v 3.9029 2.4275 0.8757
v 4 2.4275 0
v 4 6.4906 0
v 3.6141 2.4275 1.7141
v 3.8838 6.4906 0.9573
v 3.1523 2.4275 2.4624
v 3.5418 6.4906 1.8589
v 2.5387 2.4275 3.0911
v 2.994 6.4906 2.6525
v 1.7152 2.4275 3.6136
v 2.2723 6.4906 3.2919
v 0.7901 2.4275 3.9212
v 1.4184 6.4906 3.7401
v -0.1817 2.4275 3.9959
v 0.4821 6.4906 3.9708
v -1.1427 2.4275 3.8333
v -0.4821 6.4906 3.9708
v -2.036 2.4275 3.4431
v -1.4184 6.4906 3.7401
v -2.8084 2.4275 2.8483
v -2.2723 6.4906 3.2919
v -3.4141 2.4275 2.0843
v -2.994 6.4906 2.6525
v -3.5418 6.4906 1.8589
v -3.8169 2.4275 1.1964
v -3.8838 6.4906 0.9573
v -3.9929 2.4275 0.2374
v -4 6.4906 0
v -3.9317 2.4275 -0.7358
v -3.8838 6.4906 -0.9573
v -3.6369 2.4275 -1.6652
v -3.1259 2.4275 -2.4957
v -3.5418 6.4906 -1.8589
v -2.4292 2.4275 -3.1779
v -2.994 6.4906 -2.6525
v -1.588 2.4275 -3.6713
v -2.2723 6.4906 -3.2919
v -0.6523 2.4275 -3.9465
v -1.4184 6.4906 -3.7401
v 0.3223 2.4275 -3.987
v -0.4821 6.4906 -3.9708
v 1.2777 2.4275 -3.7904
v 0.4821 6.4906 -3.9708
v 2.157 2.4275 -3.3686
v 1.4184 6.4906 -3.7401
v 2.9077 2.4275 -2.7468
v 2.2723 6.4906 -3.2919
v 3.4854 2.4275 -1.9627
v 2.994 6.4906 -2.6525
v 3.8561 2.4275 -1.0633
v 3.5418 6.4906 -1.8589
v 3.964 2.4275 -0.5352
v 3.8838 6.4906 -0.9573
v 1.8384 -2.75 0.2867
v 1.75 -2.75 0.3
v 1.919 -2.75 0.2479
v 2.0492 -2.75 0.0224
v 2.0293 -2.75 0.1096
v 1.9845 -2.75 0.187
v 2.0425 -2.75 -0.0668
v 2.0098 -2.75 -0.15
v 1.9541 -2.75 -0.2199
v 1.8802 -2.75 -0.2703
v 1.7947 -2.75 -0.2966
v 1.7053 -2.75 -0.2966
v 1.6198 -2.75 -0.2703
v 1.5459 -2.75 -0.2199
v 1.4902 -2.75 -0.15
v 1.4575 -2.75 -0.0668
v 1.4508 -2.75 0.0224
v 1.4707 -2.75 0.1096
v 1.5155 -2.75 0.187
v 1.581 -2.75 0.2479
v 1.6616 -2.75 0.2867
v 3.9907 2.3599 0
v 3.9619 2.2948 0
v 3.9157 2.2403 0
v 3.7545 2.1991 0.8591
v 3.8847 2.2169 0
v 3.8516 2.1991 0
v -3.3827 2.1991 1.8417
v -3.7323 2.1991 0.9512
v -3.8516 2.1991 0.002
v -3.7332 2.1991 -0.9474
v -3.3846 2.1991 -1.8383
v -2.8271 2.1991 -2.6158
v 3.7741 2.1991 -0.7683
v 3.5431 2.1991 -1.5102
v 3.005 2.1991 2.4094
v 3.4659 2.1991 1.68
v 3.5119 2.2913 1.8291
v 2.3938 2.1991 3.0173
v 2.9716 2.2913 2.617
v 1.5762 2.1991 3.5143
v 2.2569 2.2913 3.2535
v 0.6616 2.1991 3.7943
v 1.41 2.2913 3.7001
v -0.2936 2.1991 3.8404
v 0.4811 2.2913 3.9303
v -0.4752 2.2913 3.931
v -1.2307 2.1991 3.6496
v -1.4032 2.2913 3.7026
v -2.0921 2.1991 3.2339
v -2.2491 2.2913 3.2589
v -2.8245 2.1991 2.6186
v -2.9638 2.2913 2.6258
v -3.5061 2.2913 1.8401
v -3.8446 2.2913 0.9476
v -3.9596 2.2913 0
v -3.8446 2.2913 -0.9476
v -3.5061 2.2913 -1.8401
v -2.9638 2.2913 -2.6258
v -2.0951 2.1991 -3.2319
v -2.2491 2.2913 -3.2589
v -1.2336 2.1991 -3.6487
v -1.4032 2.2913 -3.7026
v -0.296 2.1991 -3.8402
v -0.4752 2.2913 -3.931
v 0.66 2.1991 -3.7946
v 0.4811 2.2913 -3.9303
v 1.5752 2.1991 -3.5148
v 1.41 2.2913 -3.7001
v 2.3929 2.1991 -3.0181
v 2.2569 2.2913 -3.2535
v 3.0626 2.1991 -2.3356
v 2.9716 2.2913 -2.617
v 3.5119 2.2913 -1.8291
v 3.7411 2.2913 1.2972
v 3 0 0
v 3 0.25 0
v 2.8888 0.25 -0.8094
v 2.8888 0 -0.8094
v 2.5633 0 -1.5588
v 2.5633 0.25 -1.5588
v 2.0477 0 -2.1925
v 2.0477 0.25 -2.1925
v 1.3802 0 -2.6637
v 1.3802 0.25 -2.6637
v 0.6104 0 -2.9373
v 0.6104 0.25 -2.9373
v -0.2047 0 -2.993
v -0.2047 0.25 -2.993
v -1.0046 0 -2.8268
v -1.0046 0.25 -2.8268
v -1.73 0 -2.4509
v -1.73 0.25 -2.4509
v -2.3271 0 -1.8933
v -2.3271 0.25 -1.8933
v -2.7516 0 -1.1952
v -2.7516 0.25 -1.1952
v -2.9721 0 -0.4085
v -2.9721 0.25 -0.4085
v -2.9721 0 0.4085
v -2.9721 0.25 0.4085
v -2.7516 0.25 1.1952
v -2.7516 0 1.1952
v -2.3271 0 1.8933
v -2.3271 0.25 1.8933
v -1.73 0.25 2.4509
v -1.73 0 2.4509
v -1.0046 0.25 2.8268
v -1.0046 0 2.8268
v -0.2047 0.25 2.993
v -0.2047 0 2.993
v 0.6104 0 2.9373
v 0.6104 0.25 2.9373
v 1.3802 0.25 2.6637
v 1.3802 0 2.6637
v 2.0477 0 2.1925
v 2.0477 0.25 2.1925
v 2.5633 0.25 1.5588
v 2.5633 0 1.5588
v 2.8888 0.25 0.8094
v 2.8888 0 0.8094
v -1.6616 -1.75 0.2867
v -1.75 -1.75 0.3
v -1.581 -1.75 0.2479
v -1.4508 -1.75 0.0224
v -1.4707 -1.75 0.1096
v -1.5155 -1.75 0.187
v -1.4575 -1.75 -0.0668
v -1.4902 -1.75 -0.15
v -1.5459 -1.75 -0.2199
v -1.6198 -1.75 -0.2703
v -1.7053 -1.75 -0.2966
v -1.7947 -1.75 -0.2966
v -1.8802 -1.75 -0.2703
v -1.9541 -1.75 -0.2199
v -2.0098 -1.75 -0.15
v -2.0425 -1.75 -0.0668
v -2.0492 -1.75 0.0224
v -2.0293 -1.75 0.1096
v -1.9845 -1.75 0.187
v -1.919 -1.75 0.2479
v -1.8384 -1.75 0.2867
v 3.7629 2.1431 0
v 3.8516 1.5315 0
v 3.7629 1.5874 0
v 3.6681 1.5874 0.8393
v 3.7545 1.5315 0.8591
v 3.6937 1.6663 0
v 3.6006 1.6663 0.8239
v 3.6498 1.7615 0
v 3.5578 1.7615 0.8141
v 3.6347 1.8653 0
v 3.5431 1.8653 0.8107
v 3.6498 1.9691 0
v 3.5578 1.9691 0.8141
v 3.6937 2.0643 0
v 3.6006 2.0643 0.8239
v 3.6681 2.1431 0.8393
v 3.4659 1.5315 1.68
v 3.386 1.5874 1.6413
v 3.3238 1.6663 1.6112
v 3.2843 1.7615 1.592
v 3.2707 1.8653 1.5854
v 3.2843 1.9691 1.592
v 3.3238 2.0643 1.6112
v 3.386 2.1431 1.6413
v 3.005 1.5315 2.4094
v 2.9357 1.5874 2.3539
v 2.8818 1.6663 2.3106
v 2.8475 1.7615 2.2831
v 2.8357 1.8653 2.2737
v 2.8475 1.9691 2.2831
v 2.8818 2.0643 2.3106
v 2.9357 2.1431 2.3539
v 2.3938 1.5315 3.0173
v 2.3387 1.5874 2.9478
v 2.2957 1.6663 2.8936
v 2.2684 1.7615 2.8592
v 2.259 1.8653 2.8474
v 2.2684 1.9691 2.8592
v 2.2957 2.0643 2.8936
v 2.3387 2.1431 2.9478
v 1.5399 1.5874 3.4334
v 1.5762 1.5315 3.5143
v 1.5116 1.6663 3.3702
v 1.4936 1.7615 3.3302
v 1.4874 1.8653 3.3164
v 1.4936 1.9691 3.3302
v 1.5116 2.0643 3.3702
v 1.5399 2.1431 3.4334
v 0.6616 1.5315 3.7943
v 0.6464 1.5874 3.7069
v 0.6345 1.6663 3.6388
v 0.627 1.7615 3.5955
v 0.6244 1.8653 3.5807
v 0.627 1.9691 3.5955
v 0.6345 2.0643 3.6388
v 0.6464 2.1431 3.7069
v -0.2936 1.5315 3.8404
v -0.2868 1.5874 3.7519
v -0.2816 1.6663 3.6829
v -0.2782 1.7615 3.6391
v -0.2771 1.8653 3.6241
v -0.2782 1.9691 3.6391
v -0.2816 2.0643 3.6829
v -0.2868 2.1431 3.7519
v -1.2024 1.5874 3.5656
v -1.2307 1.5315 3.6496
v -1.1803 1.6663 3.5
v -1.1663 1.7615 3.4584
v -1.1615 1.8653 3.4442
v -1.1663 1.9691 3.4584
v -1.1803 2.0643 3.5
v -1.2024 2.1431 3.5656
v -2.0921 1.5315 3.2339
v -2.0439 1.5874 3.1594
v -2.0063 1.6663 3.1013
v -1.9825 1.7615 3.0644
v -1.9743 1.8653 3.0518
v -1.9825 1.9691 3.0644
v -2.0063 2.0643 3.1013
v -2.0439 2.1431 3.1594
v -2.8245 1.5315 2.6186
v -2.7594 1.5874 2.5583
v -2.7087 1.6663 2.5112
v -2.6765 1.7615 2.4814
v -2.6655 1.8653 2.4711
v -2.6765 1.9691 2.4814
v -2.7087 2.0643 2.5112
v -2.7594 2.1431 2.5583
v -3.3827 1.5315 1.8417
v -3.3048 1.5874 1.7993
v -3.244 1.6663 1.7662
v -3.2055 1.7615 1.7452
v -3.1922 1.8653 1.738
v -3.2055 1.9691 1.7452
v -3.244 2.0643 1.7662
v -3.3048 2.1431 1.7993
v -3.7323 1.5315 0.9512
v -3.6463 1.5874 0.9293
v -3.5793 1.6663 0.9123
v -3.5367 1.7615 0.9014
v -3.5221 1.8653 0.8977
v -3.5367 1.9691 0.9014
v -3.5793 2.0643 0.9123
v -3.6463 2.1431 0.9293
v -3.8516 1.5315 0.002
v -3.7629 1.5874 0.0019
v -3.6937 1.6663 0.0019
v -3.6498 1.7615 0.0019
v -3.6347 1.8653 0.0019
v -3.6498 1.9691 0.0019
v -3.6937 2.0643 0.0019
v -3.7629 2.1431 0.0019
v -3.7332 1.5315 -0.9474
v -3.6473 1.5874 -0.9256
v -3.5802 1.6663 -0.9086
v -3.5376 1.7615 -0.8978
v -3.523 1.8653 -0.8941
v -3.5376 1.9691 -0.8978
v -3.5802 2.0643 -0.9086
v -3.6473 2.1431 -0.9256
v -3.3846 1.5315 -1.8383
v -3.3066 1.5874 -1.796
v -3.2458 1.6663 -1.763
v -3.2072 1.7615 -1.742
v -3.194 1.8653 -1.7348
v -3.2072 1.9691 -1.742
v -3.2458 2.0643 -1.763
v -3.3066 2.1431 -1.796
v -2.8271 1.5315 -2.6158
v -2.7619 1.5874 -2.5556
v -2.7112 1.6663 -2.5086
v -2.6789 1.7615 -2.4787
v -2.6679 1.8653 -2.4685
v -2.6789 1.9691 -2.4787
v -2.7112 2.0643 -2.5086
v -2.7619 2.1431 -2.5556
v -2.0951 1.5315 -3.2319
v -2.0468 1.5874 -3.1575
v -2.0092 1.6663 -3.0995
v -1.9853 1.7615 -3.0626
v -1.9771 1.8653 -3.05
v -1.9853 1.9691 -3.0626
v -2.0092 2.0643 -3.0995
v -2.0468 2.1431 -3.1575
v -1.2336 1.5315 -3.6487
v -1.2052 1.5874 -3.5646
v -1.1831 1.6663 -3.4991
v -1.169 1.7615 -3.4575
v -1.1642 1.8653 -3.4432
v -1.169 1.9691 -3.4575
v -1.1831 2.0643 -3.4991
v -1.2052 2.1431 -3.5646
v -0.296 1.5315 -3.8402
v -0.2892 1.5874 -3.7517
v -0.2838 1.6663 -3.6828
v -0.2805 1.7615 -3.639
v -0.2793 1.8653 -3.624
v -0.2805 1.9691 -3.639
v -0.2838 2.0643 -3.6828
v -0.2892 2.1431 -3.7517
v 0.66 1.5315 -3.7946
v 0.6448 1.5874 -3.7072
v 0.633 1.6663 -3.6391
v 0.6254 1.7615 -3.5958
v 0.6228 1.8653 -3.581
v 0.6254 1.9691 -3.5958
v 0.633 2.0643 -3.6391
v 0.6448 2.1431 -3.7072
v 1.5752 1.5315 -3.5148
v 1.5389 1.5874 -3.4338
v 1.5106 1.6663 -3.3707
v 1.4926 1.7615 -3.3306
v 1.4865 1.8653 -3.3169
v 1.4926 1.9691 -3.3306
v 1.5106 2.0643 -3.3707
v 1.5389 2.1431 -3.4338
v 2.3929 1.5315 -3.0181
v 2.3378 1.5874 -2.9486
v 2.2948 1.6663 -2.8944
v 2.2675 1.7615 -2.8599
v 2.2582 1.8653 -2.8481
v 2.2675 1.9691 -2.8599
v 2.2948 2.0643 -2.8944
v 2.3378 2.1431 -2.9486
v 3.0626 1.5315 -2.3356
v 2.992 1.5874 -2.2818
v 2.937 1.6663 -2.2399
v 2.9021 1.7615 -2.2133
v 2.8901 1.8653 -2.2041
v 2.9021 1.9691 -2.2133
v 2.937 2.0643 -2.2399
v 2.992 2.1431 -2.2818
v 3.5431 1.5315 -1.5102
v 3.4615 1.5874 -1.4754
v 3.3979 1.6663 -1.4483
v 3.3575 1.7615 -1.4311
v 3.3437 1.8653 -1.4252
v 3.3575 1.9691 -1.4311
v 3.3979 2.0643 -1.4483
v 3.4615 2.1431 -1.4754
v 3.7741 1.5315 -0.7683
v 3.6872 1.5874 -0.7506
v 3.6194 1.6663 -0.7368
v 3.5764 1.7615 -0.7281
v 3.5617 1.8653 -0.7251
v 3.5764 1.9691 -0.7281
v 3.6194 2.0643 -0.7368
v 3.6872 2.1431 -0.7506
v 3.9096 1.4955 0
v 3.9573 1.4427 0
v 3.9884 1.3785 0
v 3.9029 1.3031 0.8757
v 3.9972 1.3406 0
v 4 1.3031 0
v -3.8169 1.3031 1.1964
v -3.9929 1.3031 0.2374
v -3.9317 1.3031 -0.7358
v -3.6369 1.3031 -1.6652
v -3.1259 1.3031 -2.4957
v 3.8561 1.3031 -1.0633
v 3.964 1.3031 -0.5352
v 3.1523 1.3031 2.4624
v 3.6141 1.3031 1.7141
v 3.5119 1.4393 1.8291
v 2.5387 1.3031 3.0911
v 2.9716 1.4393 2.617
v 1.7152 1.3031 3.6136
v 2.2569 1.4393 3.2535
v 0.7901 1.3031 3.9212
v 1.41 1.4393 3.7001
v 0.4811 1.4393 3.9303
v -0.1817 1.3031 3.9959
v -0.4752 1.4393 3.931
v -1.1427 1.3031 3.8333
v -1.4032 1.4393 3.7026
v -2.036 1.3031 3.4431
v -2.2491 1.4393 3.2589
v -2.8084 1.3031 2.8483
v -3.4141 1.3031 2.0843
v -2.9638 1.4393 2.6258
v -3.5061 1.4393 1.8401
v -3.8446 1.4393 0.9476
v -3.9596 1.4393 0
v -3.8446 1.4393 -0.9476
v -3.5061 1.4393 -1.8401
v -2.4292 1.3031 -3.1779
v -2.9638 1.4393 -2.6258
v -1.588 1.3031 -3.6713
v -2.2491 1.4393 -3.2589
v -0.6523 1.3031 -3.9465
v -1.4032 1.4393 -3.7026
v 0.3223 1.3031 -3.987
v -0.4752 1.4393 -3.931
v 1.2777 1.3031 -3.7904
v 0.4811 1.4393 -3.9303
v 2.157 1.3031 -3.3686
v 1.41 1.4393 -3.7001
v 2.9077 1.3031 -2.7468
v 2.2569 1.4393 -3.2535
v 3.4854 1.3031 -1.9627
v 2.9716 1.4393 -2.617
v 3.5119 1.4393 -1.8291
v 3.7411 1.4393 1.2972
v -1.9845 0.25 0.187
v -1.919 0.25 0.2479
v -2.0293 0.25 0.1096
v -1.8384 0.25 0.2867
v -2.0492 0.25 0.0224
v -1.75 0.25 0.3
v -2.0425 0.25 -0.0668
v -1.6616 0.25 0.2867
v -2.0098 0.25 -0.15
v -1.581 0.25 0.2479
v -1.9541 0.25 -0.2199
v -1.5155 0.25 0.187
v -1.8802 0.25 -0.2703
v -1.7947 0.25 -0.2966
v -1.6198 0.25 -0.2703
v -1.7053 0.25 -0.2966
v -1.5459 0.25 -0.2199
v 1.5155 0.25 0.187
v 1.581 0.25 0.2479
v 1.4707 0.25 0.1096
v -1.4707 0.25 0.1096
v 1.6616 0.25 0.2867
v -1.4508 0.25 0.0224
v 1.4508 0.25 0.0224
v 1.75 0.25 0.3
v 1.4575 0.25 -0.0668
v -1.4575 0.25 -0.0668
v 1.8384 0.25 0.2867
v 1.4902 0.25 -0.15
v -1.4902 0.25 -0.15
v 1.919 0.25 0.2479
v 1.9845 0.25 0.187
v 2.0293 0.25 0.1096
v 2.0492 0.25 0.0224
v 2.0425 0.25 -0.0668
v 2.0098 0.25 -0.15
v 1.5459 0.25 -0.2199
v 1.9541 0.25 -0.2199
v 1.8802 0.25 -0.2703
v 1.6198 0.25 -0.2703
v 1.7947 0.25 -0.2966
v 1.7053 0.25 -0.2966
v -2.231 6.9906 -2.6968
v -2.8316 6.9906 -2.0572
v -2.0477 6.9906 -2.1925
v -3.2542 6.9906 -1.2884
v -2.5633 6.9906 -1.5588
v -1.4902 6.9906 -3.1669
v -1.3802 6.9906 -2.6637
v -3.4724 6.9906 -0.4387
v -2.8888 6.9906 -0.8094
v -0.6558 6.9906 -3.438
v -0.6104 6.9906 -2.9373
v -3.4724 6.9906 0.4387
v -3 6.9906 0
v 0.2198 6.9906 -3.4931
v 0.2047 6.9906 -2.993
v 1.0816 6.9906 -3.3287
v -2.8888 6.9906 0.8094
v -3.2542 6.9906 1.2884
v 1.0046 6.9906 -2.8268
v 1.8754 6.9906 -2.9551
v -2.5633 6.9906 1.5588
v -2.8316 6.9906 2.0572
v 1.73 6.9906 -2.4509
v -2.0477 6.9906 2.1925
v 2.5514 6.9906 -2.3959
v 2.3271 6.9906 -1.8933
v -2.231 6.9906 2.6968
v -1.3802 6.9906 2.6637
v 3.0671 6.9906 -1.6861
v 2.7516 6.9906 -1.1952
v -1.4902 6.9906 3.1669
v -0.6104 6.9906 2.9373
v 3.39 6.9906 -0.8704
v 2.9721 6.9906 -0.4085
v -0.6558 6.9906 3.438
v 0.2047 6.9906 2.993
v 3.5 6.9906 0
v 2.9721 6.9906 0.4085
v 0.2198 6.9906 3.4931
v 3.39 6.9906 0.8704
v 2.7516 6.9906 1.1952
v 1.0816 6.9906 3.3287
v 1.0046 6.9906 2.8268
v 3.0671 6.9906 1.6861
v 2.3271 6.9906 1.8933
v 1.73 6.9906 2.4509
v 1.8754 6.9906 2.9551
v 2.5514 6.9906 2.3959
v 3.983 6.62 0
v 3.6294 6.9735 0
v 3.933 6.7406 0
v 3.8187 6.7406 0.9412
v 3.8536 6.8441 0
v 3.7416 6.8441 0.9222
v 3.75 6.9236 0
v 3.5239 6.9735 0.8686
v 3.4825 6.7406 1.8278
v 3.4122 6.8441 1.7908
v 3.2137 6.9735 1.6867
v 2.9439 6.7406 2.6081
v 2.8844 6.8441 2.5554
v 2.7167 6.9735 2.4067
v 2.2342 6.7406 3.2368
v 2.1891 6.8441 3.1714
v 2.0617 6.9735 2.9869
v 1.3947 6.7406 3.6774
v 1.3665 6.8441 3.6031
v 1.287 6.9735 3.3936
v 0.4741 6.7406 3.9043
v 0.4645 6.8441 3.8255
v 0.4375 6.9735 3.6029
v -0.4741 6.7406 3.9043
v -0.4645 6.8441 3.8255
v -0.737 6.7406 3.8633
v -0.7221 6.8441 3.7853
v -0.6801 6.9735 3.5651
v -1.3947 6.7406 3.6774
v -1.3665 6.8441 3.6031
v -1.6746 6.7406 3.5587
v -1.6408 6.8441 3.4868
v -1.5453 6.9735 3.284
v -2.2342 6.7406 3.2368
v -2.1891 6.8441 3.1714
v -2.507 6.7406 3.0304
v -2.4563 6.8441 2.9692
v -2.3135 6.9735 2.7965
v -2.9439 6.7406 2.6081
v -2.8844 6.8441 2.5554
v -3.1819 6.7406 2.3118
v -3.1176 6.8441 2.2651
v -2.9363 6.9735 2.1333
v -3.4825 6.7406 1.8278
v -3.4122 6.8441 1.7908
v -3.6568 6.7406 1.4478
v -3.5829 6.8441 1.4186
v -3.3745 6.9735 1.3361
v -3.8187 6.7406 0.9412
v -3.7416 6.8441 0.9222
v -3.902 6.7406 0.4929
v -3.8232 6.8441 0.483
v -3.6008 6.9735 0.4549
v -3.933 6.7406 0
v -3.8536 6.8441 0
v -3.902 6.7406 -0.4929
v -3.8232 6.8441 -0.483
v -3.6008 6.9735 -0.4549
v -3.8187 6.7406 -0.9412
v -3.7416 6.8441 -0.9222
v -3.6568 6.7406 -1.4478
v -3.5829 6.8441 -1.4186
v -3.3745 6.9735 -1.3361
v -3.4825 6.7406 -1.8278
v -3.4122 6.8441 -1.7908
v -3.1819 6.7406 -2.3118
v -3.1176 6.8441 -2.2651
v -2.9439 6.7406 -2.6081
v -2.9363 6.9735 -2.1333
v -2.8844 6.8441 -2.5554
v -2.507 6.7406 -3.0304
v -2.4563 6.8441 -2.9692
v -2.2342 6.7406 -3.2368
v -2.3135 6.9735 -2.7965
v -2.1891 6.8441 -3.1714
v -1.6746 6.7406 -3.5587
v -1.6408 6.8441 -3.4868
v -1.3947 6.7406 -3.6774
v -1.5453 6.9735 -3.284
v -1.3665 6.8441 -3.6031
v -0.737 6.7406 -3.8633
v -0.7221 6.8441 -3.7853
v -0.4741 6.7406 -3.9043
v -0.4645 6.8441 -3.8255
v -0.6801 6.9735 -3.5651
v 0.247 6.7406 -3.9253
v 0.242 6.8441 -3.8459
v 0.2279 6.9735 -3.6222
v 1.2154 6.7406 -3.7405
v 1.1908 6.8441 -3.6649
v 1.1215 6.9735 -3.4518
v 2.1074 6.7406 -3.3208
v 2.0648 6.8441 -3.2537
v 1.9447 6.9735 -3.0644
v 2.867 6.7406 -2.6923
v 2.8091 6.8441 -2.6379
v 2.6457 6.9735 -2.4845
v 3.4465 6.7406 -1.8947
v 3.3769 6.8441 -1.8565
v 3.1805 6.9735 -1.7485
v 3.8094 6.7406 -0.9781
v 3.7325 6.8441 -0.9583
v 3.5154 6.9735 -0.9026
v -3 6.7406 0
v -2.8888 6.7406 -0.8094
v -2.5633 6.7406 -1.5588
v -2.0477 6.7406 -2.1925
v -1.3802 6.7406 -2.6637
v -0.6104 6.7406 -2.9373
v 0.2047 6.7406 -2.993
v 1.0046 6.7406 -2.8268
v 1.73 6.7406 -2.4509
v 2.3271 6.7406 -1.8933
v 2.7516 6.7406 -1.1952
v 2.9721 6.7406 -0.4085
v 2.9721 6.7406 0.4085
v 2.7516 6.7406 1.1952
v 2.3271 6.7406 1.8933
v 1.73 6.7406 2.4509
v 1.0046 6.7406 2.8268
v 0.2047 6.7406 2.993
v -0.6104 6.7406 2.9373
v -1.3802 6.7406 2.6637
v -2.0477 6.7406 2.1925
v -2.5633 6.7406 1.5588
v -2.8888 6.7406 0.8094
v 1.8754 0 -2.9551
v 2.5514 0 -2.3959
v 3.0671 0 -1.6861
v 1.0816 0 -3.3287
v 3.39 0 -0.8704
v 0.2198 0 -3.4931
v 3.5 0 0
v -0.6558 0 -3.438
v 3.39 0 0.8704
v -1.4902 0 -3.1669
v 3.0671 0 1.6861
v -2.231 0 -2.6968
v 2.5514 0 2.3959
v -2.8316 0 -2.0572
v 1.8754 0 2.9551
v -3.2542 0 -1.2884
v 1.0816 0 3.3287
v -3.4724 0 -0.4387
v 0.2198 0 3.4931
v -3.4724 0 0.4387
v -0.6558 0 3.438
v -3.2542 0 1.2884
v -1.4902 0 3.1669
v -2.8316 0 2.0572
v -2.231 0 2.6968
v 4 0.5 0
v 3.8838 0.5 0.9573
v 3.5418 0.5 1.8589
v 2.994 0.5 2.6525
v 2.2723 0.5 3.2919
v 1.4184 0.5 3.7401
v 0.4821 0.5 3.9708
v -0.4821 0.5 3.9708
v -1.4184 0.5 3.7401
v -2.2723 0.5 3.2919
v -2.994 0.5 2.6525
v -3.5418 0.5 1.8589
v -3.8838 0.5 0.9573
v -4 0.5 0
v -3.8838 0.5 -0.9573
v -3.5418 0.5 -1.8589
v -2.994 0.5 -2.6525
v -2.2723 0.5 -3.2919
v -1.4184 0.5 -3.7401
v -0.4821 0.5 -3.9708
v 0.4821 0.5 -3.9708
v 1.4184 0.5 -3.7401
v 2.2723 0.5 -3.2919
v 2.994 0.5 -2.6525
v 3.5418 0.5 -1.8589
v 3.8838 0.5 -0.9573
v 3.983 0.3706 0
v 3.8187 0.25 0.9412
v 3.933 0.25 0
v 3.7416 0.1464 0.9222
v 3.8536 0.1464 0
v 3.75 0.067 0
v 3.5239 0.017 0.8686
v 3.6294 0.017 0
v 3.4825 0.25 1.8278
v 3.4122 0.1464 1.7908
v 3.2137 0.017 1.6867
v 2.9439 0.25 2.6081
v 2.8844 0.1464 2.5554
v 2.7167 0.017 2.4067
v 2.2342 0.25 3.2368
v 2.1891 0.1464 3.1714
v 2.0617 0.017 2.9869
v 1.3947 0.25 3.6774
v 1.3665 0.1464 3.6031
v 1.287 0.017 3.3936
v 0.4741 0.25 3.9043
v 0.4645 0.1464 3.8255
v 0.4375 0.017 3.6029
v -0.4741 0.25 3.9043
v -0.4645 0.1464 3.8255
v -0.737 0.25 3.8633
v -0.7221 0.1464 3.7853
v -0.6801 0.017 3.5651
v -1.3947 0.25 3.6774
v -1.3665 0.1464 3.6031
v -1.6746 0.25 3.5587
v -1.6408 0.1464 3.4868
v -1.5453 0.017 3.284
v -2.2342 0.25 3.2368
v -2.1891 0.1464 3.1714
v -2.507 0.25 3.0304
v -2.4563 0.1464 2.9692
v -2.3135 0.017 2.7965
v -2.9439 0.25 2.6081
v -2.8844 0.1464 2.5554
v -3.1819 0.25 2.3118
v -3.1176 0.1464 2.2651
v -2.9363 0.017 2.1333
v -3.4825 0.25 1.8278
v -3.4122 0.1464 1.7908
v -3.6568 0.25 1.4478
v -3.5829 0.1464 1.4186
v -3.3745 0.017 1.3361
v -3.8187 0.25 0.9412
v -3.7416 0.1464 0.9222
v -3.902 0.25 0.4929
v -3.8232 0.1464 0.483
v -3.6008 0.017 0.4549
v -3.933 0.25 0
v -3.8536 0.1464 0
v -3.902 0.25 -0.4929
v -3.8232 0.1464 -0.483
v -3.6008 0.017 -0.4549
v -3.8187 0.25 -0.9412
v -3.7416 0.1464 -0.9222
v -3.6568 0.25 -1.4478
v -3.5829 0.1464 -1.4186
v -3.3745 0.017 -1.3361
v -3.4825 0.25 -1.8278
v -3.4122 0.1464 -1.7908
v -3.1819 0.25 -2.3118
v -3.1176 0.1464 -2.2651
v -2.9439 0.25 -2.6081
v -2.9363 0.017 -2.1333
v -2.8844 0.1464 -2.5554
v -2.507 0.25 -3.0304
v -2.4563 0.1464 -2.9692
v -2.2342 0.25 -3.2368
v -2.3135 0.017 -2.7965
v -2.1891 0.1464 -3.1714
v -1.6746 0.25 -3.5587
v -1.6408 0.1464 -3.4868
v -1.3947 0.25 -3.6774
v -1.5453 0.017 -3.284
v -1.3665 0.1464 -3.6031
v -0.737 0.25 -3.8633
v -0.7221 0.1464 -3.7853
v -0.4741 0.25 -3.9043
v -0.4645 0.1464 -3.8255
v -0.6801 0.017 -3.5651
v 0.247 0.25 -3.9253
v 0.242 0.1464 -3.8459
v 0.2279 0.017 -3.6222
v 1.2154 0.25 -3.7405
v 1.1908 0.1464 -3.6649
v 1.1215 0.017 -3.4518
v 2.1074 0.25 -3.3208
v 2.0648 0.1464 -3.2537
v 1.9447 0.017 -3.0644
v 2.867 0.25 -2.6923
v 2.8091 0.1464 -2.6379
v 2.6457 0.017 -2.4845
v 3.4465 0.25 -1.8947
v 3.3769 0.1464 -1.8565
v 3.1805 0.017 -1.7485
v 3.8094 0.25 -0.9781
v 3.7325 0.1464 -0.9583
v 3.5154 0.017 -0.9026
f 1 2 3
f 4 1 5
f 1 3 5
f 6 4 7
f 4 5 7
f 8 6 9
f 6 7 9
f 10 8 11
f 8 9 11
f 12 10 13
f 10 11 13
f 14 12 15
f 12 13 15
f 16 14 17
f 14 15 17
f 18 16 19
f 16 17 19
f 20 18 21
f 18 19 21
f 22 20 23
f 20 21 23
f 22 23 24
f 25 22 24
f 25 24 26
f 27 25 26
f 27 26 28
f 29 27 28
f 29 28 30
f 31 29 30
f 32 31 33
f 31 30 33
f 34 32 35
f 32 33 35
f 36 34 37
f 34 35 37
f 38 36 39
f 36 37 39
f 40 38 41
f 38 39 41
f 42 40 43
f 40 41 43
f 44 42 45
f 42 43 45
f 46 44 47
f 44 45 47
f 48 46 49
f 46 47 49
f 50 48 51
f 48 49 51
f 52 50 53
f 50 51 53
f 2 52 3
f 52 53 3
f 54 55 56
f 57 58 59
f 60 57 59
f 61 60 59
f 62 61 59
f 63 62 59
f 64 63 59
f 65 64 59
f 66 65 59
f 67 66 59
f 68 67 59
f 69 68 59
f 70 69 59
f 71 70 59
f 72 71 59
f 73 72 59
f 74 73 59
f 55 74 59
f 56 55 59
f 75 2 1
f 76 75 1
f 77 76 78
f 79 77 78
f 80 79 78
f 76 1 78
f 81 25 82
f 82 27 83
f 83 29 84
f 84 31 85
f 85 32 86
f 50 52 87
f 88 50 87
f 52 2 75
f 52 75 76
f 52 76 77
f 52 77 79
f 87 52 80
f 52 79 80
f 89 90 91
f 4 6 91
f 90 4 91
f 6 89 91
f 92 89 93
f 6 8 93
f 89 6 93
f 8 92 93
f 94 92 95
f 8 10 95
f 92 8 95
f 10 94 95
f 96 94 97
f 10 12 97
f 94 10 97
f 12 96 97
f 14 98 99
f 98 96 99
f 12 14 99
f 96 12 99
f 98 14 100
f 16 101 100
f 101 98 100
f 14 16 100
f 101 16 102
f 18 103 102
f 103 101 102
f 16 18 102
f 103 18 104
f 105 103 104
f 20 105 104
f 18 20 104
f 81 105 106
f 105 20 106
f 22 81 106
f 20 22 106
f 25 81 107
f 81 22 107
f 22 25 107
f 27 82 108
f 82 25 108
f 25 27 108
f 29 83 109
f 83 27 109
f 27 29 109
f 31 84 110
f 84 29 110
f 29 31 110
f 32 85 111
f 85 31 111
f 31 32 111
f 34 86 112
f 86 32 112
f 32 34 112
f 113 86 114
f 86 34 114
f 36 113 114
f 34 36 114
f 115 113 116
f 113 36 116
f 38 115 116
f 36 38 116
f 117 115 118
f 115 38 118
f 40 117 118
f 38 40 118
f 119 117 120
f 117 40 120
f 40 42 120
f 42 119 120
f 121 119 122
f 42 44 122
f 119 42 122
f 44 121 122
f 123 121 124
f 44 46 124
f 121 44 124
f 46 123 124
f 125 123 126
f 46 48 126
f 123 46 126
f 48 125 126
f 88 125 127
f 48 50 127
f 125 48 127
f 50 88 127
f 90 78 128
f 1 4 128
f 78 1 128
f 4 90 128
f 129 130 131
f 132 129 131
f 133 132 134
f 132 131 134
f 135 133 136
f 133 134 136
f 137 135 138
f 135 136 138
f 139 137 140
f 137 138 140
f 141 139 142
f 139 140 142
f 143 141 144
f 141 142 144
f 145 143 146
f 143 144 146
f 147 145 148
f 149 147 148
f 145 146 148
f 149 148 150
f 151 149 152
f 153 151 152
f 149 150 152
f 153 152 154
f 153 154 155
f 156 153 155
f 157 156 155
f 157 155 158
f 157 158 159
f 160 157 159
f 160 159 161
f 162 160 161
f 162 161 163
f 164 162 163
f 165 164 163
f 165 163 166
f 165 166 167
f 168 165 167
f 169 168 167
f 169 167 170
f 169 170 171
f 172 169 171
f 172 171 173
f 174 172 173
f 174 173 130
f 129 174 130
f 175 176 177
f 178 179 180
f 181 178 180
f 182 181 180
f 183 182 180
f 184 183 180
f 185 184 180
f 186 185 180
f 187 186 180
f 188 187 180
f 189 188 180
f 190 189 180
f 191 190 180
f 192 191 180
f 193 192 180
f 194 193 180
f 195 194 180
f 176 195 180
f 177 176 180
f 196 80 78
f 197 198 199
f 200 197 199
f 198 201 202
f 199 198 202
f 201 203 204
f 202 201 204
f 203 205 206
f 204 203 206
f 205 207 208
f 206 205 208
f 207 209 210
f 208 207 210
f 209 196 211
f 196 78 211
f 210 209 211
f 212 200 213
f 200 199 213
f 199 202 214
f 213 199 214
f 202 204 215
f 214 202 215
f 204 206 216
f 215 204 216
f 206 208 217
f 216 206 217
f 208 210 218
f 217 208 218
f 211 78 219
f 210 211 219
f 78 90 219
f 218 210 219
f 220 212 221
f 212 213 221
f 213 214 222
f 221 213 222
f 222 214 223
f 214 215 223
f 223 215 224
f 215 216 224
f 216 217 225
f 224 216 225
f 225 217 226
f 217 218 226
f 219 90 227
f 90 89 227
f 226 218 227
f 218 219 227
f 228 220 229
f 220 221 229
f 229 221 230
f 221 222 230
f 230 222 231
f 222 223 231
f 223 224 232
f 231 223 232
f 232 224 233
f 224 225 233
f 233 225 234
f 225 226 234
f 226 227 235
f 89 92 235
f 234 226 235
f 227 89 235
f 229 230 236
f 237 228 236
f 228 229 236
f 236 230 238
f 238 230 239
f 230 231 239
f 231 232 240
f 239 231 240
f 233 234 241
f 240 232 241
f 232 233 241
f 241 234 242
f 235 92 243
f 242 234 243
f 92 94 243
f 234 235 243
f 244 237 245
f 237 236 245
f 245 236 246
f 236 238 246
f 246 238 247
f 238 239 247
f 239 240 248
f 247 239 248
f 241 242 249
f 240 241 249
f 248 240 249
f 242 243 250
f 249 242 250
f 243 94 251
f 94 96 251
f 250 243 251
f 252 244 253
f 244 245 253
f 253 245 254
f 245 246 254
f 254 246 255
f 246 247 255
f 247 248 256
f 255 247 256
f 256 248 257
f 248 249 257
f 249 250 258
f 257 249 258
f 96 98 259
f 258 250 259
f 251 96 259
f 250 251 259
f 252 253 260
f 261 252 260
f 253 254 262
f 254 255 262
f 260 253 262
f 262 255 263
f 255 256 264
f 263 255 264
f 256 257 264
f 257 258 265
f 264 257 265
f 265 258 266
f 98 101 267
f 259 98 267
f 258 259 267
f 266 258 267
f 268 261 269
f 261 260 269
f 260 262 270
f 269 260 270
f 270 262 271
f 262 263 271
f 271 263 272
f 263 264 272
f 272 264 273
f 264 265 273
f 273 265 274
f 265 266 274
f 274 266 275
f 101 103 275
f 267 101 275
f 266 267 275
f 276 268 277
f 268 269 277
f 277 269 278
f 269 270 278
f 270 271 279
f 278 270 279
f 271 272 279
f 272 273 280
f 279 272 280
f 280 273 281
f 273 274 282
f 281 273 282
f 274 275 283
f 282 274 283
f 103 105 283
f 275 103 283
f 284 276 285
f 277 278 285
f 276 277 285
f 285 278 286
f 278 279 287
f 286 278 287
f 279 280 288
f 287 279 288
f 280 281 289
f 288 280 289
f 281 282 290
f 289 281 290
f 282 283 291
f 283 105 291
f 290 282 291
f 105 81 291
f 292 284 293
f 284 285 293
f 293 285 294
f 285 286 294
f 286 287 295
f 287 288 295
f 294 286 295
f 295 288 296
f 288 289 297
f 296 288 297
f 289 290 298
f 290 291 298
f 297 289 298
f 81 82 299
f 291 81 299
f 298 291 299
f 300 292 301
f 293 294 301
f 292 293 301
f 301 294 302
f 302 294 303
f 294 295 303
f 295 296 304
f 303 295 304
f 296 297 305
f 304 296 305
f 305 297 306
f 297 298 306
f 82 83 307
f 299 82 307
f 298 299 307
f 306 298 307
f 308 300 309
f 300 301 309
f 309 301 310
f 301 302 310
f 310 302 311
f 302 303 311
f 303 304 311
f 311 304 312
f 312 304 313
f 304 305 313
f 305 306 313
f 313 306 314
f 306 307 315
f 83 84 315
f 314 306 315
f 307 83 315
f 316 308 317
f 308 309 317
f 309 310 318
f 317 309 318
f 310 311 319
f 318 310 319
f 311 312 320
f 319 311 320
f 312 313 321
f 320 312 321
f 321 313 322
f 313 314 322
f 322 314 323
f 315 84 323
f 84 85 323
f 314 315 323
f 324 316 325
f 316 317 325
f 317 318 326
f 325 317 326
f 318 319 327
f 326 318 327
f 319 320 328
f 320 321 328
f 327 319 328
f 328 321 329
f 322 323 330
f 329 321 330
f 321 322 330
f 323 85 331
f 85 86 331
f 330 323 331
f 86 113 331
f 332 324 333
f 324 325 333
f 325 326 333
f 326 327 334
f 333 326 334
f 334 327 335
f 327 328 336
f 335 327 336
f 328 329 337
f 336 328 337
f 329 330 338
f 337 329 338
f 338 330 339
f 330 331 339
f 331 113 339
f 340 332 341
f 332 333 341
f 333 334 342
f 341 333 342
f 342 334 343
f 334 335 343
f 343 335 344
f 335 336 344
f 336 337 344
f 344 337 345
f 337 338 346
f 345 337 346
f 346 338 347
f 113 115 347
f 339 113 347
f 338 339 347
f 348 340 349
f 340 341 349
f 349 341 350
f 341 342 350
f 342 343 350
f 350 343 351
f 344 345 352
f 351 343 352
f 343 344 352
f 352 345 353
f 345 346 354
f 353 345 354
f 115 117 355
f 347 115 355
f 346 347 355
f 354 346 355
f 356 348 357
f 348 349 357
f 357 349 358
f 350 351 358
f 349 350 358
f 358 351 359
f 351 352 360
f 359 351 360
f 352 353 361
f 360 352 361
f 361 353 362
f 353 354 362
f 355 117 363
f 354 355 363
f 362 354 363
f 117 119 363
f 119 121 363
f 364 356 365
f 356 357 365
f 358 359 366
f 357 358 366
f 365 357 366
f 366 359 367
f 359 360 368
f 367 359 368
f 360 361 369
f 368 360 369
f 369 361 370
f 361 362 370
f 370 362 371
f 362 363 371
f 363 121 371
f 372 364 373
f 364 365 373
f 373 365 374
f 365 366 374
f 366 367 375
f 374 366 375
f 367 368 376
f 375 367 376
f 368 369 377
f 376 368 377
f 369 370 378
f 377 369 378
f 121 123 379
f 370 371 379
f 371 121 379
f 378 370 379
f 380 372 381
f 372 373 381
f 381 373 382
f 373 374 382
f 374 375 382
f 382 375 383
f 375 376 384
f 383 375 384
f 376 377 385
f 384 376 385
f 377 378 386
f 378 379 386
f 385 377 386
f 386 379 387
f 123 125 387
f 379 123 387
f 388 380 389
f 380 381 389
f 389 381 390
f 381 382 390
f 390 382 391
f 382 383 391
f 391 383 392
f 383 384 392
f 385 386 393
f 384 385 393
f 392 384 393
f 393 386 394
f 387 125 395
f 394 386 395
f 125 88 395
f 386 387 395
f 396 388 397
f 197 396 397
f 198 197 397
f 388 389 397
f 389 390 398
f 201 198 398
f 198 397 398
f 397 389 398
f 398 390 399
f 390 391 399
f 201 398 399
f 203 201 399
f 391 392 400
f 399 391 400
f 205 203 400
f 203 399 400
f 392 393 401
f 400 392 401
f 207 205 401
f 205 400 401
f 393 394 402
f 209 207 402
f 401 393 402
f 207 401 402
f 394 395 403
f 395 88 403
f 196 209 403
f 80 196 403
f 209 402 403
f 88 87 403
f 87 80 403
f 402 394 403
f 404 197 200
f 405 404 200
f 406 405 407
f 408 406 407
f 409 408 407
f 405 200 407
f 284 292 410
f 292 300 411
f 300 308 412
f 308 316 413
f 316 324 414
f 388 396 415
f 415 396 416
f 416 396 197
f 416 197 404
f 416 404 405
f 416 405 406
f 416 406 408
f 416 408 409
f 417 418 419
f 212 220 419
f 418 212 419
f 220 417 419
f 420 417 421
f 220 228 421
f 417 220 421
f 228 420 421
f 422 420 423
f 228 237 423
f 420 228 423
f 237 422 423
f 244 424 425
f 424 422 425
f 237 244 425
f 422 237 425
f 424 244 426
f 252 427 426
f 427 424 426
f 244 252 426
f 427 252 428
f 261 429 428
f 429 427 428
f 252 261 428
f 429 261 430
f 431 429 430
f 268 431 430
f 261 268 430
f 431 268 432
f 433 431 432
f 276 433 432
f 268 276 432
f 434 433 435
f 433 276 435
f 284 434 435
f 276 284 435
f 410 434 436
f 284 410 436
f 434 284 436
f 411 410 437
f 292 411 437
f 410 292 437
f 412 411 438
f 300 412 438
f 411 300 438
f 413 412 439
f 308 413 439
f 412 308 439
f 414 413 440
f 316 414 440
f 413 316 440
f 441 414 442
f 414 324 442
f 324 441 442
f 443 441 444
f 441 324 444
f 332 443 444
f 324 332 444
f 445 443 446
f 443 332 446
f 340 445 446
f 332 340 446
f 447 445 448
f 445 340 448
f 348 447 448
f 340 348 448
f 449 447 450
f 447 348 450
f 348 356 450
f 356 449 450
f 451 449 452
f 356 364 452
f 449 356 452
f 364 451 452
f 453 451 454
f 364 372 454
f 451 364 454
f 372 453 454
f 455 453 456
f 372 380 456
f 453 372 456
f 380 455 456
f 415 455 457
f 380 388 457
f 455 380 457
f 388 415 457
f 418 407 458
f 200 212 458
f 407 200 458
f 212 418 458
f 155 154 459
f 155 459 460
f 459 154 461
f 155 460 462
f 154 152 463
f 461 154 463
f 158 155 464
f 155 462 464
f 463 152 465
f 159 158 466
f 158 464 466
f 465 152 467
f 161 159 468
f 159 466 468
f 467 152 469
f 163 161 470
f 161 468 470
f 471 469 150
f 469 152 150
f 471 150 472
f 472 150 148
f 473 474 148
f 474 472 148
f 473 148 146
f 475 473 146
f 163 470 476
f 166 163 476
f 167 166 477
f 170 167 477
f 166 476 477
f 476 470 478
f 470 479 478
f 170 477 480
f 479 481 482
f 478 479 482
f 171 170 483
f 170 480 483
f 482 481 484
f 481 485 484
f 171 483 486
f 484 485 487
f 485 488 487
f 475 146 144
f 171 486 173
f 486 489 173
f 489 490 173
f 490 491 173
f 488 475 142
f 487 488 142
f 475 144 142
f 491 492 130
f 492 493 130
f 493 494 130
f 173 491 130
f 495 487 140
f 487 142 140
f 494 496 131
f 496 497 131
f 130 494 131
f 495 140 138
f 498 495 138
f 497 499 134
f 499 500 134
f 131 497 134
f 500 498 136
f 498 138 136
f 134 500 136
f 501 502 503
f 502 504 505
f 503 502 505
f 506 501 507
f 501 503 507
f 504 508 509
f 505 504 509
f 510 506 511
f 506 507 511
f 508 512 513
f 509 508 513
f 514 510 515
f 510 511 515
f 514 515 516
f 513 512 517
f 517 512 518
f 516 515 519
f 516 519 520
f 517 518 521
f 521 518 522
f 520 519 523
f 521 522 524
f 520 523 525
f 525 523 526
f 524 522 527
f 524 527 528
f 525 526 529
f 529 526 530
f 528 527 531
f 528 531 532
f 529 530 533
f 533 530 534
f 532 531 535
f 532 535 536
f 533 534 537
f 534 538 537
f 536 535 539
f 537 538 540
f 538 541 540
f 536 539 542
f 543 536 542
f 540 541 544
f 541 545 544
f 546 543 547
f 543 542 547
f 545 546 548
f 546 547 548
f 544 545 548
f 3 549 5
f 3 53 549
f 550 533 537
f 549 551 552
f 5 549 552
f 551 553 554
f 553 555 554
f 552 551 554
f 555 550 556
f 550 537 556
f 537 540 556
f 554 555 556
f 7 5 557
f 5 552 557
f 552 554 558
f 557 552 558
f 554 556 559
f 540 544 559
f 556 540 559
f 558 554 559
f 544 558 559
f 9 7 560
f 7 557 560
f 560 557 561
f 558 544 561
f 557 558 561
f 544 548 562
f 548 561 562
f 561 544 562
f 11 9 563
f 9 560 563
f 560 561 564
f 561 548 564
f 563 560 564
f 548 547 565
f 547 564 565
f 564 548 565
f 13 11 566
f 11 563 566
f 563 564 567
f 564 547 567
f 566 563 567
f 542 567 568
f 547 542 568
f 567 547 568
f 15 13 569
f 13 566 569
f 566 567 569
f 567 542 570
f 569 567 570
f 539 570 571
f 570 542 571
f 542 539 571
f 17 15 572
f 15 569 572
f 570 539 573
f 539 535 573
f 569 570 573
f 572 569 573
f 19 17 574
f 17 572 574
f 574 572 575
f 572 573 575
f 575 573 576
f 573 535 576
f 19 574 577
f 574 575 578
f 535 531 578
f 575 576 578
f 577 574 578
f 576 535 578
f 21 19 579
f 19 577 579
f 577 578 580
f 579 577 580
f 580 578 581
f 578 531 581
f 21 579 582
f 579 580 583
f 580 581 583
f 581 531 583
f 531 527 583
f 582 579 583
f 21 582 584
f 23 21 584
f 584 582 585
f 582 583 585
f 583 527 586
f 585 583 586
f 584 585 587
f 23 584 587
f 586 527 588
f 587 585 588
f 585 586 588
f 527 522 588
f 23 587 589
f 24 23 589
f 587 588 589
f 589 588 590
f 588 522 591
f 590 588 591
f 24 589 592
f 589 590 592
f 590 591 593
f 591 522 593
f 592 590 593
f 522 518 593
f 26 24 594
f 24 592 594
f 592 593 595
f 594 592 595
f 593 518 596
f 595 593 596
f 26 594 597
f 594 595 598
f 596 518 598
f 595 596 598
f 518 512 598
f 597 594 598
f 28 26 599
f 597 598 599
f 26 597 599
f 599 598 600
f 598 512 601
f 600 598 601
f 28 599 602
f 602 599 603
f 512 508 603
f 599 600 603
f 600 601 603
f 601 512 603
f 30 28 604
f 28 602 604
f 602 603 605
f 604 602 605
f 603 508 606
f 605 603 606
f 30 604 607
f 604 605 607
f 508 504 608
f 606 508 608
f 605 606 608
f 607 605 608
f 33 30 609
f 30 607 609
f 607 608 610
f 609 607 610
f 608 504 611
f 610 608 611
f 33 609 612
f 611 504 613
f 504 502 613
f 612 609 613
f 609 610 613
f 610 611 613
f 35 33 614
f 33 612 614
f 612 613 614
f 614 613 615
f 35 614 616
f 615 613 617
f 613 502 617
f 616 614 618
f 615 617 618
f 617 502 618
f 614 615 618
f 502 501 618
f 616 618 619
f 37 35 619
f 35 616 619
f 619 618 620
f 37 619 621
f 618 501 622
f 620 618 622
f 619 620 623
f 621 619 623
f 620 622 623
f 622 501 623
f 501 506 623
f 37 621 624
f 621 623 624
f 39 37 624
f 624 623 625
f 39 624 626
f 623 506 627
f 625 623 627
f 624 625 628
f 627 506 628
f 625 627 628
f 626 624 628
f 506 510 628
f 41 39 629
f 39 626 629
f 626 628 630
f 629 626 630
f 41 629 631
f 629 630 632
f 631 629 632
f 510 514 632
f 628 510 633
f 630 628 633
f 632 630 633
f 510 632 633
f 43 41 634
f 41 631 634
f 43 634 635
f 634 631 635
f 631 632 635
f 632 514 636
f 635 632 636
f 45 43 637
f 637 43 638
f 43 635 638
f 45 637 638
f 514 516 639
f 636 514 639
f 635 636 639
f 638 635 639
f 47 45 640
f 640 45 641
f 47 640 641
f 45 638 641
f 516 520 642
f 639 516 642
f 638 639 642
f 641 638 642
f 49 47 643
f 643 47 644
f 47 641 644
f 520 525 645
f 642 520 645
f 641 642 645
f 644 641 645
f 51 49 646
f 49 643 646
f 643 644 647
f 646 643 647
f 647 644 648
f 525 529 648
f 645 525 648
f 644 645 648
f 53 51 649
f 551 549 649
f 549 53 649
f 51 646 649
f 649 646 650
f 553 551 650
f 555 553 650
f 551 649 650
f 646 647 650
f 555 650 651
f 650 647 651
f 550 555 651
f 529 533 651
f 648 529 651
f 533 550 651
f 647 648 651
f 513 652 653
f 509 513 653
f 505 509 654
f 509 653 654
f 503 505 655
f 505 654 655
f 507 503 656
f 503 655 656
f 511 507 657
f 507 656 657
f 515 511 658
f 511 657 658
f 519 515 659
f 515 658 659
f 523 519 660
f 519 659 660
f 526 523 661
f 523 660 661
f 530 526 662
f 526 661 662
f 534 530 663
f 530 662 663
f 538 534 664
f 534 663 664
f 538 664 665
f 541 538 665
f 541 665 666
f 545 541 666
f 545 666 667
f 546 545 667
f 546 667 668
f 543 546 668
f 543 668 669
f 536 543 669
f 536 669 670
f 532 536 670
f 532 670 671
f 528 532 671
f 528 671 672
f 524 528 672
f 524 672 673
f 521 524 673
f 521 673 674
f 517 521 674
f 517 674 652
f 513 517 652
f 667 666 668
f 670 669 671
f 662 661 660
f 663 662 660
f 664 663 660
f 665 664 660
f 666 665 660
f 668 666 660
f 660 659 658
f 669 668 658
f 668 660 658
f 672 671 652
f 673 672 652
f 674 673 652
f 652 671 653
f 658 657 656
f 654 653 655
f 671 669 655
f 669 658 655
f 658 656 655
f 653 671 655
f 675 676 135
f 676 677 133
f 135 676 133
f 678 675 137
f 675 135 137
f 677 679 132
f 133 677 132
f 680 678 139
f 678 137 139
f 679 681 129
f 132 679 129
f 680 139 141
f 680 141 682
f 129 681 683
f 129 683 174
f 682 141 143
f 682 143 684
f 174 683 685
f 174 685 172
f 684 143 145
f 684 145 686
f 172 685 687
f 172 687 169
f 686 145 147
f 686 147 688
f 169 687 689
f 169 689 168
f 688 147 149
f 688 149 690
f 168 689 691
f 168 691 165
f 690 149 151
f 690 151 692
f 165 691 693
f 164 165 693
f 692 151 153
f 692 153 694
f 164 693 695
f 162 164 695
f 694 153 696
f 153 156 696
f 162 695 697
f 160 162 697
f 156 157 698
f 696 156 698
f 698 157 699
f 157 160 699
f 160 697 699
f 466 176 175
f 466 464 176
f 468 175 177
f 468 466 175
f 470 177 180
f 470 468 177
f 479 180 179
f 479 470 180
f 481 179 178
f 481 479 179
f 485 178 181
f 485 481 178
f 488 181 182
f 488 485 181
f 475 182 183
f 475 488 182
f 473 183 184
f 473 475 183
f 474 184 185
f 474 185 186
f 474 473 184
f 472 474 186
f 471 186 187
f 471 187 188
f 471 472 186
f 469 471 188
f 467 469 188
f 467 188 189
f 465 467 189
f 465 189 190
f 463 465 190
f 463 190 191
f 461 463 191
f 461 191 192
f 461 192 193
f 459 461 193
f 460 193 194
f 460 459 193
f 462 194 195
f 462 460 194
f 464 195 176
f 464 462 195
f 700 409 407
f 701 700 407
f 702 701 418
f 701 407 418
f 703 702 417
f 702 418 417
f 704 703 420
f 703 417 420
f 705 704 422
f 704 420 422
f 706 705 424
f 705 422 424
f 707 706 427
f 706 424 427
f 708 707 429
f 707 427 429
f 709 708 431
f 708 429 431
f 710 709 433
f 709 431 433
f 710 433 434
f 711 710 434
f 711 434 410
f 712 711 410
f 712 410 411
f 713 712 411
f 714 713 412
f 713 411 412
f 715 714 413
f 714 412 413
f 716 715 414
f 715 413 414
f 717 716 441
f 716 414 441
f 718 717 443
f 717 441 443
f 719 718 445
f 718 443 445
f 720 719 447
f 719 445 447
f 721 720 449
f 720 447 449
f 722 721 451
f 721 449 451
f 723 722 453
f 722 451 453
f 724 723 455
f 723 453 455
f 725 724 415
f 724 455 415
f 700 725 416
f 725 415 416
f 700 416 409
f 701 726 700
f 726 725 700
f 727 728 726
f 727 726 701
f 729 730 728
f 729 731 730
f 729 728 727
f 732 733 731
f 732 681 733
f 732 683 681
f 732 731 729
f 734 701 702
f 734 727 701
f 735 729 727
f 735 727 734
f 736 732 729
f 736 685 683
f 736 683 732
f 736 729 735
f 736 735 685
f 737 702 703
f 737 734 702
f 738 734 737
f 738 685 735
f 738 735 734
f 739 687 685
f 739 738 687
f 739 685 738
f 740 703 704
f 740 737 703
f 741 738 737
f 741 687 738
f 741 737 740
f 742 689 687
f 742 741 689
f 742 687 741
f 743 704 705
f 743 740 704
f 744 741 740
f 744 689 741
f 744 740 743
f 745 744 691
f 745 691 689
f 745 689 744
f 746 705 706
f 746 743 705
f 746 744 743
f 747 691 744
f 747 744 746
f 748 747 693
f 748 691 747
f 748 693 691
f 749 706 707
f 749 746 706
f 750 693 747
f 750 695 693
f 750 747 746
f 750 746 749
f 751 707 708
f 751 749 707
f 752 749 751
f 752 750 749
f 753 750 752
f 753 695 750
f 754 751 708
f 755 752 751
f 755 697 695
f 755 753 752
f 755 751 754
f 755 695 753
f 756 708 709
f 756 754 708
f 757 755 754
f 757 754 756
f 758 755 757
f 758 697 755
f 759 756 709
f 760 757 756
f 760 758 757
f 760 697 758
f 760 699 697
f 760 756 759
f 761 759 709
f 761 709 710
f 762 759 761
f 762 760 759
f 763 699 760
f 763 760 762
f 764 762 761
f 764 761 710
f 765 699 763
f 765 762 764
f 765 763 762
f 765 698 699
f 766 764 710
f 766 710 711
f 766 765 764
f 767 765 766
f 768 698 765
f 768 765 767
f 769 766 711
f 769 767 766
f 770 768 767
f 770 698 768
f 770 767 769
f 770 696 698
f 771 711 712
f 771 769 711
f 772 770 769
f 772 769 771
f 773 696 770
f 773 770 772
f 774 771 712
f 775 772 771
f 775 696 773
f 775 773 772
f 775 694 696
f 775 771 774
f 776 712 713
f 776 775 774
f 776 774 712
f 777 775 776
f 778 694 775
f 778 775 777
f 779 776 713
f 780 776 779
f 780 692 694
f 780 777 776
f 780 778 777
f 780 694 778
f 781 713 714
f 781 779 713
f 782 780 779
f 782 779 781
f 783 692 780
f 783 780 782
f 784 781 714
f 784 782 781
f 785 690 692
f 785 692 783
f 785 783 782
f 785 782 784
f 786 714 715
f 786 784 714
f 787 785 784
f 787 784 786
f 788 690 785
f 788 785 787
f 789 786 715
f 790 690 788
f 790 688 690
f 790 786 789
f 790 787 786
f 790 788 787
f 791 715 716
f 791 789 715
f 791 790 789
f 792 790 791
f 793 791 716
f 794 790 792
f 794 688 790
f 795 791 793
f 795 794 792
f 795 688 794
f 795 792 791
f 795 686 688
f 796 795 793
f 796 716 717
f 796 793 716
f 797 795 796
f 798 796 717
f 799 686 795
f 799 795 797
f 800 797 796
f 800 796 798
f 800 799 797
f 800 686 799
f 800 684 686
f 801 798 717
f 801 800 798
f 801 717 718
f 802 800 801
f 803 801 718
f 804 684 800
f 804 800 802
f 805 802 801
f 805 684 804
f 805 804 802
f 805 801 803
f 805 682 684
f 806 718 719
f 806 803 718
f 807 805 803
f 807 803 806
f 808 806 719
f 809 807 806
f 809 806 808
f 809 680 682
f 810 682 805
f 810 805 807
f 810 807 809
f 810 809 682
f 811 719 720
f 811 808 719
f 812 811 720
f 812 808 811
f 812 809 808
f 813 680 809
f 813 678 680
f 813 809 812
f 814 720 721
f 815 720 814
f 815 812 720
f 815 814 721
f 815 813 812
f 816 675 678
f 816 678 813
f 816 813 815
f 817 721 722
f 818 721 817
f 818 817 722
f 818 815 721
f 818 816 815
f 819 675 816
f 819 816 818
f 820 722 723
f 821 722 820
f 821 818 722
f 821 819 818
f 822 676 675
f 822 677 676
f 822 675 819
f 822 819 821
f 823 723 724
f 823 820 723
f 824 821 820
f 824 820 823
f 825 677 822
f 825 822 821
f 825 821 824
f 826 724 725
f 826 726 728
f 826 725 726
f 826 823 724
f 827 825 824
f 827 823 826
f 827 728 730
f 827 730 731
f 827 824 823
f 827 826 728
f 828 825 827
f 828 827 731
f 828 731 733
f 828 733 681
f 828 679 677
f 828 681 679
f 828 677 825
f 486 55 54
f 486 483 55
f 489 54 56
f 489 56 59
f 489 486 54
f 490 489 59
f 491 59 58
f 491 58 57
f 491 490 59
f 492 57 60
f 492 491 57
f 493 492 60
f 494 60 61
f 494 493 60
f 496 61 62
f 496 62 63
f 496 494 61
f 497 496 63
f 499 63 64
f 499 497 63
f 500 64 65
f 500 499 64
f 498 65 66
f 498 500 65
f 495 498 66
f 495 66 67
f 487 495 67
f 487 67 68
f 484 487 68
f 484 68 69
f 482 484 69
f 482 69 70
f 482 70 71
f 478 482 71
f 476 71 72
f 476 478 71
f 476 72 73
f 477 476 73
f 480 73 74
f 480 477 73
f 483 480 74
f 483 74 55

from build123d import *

# Parameters (mm, degrees)
HOLE_WIZARD_6_0_6_1_D     = 6
HOLE_WIZARD_6_0_6_1_DEPTH = 0.25
SKETCH_4_W                = 0.3
SKETCH_4_H                = 3
SKETCH_5_W                = 0.3
SKETCH_5_H                = 2
HOLE_WIZARD_6_0_6_2_D     = 6
HOLE_WIZARD_6_0_6_2_DEPTH = 0.25
FILLET_1_R                = 0.25
FILLET_2_R                = 0.5


with BuildPart() as part:
    # 草图1 → 旋转1 (revolve)
    with BuildSketch(Plane.XY):
        with BuildLine():
            Line((4, 6.99057192), (0, 6.99057192))
            Line((0, 6.99057192), (0, 0))
            Line((0, 0), (4, 0))
            Line((4, 0), (4, 1.5))
            ThreePointArc((4, 1.5), (3.63471404, 1.86528596), (4, 2.23057192))
            Line((4, 2.23057192), (4, 6.99057192))
        make_face()
    revolve(axis=Axis((0, 6.99057192, 0), (0, -1, 0)))

    # Ø6.0 (6) 直径孔1
    with Locations(Plane(origin=(0, 0, 0), x_dir=(-1, 0, 0), z_dir=(0, -1, 0))):
        with Locations((0, 0)):
            Hole(HOLE_WIZARD_6_0_6_1_D / 2, depth=HOLE_WIZARD_6_0_6_1_DEPTH)

    # 草图4 → 旋转2 (revolve)
    with BuildSketch(Plane(origin=(0, 0, 0), x_dir=(-1, 0, 0), z_dir=(0, 0, -1)), mode=Mode.PRIVATE) as revolve_2_sk:
        with Locations((-1.9, -1.25)):
            Rectangle(SKETCH_4_W, SKETCH_4_H)
    revolve(revolve_2_sk.sketch.rotate(Axis((1.75, -2.75, 0), (0, 1, 0)), 270), axis=Axis((1.75, -2.75, 0), (0, 1, 0)))

    # 草图5 → 旋转3 (revolve)
    with BuildSketch(Plane(origin=(0, 0, 0), x_dir=(-1, 0, 0), z_dir=(0, 0, -1)), mode=Mode.PRIVATE) as revolve_3_sk:
        with Locations((1.6, -0.75)):
            Rectangle(SKETCH_5_W, SKETCH_5_H)
    revolve(revolve_3_sk.sketch.rotate(Axis((-1.75, -1.75, 0), (0, 1, 0)), 270), axis=Axis((-1.75, -1.75, 0), (0, 1, 0)))

    # Ø6.0 (6) 直径孔2
    with Locations(Plane(origin=(0, 6.99057192, 0), x_dir=(1, 0, 0), z_dir=(0, 1, 0))):
        with Locations((0, 0)):
            Hole(HOLE_WIZARD_6_0_6_2_D / 2, depth=HOLE_WIZARD_6_0_6_2_DEPTH)

    # 圆角1
    fillet_1_edges = [part.edges().sort_by_distance(p)[0] for p in [
        (-4, 1.5, 0),
        (-4, 2.23057192, 0),
    ]]
    fillet(fillet_1_edges, radius=FILLET_1_R)

    # 圆角2
    fillet_2_edges = [part.edges().sort_by_distance(p)[0] for p in [
        (-4, 6.99057192, 0),
        (-4, 0, 0),
    ]]
    fillet(fillet_2_edges, radius=FILLET_2_R)


solid = part.part
